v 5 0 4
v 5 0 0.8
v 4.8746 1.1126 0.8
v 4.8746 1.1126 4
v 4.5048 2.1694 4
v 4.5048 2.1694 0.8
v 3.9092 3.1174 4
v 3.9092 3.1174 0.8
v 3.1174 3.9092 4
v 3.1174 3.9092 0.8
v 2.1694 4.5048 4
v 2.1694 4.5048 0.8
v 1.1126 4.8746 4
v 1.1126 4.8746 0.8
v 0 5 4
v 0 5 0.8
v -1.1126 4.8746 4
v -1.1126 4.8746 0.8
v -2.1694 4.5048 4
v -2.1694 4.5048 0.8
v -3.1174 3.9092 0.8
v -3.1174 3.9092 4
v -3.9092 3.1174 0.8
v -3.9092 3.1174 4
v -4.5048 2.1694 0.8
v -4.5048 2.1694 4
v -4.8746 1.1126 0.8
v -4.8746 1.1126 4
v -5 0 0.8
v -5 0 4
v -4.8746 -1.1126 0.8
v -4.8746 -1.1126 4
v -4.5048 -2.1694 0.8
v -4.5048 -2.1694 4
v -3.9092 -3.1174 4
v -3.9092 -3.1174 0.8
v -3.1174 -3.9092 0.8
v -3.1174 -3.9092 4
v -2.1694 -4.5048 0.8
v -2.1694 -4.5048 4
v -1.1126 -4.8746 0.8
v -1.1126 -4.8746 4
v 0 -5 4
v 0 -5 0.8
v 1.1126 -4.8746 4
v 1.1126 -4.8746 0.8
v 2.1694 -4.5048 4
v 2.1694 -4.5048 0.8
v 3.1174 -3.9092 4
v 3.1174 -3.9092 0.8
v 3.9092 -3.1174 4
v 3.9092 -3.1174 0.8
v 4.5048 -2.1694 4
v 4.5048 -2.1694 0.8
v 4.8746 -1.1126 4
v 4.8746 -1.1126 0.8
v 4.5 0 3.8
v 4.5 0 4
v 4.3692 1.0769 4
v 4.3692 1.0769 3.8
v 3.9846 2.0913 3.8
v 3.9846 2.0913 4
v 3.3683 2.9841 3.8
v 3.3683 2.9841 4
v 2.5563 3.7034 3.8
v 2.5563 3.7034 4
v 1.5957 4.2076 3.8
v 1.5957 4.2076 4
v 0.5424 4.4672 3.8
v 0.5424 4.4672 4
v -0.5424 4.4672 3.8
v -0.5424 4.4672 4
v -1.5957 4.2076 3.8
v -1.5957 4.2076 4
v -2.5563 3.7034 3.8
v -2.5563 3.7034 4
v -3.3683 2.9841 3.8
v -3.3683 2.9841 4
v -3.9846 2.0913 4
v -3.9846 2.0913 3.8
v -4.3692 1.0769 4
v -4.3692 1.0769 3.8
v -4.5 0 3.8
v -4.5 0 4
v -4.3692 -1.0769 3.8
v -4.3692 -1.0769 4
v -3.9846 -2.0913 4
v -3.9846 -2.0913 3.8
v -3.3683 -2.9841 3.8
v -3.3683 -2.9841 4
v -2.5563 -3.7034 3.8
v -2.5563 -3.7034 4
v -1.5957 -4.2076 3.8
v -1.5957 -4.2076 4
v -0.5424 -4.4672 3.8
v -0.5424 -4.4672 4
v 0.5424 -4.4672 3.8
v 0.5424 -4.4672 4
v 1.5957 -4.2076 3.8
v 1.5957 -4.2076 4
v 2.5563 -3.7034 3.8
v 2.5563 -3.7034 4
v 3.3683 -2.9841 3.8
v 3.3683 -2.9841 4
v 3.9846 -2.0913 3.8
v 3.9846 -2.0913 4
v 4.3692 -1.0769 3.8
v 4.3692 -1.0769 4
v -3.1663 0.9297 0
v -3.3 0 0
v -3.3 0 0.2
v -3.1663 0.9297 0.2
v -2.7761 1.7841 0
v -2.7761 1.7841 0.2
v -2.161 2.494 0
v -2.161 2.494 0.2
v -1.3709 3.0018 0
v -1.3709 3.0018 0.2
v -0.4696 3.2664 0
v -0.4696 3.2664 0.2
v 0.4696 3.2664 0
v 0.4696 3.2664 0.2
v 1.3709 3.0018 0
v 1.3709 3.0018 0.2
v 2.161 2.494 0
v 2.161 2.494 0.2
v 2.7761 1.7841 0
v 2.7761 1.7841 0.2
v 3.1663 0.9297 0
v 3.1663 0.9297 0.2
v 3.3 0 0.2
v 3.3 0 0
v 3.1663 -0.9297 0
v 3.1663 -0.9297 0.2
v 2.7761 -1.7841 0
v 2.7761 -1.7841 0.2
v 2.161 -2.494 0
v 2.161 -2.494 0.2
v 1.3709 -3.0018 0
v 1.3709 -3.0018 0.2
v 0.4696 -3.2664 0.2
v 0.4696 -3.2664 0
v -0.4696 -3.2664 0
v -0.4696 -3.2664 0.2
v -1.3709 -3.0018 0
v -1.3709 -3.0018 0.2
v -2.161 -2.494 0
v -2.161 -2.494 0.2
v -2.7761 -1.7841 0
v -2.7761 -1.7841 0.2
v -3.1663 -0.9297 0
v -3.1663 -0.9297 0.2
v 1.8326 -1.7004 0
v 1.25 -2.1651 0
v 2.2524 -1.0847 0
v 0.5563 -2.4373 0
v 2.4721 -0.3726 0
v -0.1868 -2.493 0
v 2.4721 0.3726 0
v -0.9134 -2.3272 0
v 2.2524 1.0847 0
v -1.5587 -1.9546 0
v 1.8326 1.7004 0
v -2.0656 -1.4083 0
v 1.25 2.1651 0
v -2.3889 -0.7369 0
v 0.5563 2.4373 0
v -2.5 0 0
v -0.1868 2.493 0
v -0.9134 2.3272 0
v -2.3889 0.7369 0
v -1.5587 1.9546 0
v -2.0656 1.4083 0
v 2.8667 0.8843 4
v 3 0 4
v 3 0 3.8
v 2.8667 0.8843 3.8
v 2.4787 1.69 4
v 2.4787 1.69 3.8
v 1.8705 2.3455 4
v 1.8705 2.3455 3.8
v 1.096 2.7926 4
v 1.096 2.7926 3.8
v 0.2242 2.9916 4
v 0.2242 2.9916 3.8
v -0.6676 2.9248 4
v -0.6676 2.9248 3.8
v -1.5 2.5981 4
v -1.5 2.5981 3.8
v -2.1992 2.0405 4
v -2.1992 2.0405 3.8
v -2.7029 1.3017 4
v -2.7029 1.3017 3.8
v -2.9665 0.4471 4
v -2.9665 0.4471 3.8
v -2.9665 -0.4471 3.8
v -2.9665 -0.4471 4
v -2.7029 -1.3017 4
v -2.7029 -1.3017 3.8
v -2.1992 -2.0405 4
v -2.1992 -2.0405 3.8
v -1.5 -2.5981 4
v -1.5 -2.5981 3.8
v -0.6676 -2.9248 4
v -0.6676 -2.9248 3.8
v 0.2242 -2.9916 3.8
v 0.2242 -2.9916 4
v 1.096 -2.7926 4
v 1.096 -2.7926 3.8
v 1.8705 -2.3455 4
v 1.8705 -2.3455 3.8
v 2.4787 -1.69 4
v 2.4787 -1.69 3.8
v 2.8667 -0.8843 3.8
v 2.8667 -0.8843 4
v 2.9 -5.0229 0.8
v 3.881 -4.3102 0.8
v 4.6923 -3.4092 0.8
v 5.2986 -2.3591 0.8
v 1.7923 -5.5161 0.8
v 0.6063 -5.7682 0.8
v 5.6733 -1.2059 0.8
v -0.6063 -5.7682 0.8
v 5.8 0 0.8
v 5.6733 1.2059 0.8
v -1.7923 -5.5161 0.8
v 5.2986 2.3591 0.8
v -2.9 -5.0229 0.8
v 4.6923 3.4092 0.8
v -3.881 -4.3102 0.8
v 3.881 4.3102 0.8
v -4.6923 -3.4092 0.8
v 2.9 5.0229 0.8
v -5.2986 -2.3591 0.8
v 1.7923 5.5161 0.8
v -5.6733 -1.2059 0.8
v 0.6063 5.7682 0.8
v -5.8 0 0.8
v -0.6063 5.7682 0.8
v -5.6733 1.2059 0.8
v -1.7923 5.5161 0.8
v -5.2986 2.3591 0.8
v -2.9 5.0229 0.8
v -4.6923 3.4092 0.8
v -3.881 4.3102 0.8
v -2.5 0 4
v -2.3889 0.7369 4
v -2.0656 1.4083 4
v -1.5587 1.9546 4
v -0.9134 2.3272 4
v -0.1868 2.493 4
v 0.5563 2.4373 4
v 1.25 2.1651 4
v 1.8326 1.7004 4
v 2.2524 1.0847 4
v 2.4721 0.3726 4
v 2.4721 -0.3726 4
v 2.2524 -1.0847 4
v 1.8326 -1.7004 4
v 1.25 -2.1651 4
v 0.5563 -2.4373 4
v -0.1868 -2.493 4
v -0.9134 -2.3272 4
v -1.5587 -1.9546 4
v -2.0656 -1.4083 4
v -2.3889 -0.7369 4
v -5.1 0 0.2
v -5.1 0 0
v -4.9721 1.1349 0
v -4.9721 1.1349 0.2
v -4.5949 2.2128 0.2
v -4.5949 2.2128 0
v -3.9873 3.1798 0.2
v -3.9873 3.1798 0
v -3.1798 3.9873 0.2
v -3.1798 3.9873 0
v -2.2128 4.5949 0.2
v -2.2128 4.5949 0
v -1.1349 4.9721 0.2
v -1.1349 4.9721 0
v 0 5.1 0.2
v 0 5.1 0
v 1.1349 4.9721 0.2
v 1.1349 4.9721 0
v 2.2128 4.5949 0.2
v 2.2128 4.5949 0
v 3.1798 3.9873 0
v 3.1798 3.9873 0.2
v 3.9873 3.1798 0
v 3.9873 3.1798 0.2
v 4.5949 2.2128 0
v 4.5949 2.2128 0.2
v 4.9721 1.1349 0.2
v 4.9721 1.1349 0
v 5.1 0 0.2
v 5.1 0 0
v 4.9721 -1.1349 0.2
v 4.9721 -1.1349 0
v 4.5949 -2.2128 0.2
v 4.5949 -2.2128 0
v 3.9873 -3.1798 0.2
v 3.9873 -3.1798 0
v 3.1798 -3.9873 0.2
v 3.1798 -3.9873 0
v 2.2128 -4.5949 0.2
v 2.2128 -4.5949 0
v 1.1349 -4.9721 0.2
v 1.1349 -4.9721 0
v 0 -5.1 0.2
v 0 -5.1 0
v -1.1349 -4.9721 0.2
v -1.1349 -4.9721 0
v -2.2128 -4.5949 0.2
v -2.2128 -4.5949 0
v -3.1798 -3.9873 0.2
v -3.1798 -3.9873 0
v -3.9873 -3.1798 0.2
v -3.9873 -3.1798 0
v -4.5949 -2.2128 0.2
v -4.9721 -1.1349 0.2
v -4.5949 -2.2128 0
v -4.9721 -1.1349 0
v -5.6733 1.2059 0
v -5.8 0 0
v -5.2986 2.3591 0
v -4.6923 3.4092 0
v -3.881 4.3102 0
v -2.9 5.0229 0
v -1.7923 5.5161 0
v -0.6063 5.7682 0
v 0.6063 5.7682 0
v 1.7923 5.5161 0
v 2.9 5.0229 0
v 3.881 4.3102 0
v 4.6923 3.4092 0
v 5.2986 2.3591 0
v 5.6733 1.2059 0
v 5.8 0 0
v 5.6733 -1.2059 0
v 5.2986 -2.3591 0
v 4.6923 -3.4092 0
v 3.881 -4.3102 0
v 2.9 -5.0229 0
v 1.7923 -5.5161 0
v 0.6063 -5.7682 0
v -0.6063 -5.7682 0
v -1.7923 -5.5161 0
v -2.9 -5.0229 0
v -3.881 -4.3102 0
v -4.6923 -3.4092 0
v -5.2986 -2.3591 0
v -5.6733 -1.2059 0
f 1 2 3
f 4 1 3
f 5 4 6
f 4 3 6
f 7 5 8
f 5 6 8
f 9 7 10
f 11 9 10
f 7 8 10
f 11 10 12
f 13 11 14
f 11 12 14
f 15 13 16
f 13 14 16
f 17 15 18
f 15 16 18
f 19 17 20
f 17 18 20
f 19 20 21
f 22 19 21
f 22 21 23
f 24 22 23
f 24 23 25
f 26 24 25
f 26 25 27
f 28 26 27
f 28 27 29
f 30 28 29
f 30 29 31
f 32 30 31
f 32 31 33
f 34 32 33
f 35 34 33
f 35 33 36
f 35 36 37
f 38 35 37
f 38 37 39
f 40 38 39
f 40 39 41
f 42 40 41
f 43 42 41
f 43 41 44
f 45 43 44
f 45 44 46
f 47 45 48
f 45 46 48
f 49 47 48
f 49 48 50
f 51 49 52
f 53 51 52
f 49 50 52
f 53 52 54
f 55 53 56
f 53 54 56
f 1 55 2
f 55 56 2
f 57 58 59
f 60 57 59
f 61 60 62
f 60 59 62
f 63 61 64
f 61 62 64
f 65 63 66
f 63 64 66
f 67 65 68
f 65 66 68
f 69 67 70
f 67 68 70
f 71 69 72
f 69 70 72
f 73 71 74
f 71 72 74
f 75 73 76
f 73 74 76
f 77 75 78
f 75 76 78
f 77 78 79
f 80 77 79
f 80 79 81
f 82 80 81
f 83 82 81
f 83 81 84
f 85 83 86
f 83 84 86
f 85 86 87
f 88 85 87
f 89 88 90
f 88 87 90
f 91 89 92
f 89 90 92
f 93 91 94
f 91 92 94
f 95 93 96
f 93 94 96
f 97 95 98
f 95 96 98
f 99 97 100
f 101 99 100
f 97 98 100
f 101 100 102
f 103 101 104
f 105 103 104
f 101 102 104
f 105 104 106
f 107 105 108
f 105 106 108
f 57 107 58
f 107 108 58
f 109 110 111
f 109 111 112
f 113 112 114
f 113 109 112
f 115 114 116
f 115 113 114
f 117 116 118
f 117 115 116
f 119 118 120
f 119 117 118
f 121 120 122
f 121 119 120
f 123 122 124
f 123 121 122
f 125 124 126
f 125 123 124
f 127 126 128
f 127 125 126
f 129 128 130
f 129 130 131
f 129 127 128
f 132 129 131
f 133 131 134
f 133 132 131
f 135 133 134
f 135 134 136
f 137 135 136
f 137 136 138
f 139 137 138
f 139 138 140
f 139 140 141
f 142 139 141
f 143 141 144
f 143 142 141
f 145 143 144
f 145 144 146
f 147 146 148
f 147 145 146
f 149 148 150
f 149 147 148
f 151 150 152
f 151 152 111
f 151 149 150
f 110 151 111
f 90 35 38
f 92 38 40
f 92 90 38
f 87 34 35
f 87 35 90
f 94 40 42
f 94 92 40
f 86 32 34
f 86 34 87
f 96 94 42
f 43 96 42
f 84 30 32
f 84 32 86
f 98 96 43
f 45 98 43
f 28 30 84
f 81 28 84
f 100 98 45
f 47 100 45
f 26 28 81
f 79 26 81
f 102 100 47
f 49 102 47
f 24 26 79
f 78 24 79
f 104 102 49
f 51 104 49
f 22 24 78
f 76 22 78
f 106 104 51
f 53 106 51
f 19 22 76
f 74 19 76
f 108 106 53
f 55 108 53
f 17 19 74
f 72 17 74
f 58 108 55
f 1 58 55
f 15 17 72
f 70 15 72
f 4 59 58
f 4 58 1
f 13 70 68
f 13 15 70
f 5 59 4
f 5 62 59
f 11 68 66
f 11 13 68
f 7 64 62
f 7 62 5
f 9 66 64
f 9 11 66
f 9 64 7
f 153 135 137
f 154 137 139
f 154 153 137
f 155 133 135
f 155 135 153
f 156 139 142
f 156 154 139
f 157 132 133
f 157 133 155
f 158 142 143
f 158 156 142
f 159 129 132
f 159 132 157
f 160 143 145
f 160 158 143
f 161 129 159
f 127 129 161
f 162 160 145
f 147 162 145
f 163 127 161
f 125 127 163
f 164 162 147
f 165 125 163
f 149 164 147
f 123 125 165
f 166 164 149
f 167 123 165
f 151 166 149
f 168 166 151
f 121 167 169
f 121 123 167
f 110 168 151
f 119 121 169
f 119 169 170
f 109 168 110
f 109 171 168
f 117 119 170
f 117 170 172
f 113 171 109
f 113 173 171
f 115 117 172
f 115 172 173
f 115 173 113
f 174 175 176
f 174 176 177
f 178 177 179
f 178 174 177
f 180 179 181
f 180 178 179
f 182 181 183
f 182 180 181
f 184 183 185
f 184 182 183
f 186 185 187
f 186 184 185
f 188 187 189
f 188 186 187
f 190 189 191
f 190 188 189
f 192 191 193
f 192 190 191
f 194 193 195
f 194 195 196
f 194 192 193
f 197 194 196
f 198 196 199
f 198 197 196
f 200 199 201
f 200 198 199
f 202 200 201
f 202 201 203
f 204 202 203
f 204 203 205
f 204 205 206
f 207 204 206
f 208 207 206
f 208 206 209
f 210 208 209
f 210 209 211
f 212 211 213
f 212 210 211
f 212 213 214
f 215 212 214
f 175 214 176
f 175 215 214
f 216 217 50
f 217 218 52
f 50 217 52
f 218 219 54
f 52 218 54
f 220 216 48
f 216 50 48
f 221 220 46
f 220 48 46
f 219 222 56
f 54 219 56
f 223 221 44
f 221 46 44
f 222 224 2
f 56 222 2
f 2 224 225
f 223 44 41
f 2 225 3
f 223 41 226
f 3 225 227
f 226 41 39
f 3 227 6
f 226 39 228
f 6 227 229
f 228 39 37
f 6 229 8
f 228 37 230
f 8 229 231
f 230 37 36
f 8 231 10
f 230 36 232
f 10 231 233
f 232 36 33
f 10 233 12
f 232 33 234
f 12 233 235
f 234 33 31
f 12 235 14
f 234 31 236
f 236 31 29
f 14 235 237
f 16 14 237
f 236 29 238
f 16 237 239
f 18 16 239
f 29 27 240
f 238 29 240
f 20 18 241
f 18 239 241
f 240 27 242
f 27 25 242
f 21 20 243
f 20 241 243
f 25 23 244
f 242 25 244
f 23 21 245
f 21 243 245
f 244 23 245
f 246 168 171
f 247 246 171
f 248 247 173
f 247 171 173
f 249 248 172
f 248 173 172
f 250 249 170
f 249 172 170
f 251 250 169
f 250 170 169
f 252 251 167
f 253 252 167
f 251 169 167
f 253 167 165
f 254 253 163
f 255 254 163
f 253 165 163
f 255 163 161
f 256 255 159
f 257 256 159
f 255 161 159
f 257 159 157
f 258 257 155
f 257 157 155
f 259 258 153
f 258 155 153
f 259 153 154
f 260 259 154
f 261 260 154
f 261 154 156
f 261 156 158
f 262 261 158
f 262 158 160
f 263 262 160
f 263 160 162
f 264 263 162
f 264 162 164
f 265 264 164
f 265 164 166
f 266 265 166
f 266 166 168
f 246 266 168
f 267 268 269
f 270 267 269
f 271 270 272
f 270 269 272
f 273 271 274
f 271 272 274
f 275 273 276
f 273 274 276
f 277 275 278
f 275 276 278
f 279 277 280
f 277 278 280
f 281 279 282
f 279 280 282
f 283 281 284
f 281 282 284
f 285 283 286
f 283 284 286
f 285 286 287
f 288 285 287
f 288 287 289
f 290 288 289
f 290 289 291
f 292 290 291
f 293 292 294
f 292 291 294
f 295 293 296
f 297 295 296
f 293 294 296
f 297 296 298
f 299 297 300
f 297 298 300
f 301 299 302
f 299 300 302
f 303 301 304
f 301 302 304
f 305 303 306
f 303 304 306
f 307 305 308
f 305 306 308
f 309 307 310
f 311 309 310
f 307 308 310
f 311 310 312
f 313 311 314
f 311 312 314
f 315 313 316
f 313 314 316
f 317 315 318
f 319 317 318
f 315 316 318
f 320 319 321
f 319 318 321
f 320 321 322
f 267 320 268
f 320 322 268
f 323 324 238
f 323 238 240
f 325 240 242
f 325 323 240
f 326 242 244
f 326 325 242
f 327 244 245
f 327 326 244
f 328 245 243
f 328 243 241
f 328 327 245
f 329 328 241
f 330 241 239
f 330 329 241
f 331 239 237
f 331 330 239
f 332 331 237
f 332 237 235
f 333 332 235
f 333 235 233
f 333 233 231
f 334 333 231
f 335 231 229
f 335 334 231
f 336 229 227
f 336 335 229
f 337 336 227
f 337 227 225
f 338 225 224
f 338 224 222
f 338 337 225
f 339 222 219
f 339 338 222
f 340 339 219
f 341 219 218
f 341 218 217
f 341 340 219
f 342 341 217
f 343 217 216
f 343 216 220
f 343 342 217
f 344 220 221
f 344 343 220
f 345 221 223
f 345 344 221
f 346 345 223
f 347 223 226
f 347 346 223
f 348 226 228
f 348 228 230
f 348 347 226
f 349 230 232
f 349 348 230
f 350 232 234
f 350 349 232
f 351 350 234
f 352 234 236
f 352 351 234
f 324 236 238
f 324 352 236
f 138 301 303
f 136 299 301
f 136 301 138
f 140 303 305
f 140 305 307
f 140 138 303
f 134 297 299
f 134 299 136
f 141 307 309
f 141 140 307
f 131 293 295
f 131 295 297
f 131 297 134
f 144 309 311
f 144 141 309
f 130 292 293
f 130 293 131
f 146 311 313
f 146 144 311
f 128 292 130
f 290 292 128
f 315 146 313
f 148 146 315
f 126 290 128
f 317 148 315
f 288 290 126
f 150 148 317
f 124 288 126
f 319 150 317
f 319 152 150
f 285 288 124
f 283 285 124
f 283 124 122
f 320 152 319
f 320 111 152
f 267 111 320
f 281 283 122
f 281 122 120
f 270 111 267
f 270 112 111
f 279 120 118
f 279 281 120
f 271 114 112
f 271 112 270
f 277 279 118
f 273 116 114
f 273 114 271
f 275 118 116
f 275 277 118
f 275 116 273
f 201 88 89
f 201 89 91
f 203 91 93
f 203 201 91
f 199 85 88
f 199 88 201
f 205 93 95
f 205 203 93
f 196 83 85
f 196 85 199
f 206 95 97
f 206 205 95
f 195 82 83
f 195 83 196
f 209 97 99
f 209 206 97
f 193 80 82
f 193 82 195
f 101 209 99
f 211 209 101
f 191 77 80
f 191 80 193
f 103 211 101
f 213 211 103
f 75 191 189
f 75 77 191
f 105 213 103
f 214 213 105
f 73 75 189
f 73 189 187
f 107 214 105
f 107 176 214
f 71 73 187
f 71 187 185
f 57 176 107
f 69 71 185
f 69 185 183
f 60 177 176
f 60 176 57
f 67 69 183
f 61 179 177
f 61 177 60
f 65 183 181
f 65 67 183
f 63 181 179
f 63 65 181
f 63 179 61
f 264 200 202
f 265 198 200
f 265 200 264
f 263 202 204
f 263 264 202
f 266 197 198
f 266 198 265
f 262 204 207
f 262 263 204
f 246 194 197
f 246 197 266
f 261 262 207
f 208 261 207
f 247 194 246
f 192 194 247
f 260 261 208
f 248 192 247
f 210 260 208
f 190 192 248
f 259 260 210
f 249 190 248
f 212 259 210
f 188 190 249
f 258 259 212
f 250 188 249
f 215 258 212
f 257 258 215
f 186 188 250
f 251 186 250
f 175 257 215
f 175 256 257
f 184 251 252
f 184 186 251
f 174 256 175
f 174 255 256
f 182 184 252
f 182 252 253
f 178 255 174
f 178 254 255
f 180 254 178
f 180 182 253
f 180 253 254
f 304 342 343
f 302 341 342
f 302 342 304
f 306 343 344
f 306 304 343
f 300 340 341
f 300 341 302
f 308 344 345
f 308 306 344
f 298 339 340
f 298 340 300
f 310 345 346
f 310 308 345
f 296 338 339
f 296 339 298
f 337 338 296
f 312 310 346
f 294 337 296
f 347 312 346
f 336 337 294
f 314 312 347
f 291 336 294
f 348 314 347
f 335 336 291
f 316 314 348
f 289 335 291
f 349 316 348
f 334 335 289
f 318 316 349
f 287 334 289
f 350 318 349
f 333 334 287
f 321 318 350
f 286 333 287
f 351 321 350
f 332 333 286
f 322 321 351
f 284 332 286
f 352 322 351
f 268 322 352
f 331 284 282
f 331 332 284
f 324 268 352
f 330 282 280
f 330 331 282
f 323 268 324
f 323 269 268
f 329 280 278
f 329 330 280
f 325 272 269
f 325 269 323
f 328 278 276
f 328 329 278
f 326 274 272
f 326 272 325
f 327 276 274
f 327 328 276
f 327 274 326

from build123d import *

# Parameters (mm, degrees)
SKETCH_1_R          = 5
EXTRUDE_1_DEPTH     = 4
SKETCH_2_R          = 5.8
EXTRUDE_2_DEPTH     = 0.8
SKETCH_3_R          = 2.5
CUT_EXTRUDE_1_DEPTH = 5
SKETCH_4_R          = 5.1
SKETCH_4_R_2        = 3.3
CUT_EXTRUDE_3_DEPTH = 0.2
SKETCH_5_R          = 4.5
SKETCH_5_R_2        = 3
CUT_EXTRUDE_4_DEPTH = 0.2


with BuildPart() as part:
    # 草圖1 → 填料-伸長1 (new body)
    with BuildSketch(Plane.XY):
        Circle(SKETCH_1_R)
    extrude(amount=EXTRUDE_1_DEPTH)

    # 草圖2 → 填料-伸長2 (add)
    with BuildSketch(Plane(origin=(0, 0, 0), x_dir=(-1, 0, 0), z_dir=(0, 0, -1))):
        Circle(SKETCH_2_R)
    extrude(amount=-EXTRUDE_2_DEPTH)

    # 草圖3 → 除料-伸長1 (cut, through all)
    with BuildSketch(Plane(origin=(0, 0, 0), x_dir=(-1, 0, 0), z_dir=(0, 0, -1))):
        Circle(SKETCH_3_R)
    extrude(amount=-CUT_EXTRUDE_1_DEPTH, mode=Mode.SUBTRACT)

    # 草圖4 → 除料-伸長3 (cut)
    with BuildSketch(Plane(origin=(0, 0, 0), x_dir=(-1, 0, 0), z_dir=(0, 0, -1))):
        Circle(SKETCH_4_R)
        Circle(SKETCH_4_R_2, mode=Mode.SUBTRACT)
    extrude(amount=-CUT_EXTRUDE_3_DEPTH, mode=Mode.SUBTRACT)

    # 草圖5 → 除料-伸長4 (cut)
    with BuildSketch(Plane.XY.offset(4)):
        Circle(SKETCH_5_R)
        Circle(SKETCH_5_R_2, mode=Mode.SUBTRACT)
    extrude(amount=-CUT_EXTRUDE_4_DEPTH, mode=Mode.SUBTRACT)


solid = part.part
